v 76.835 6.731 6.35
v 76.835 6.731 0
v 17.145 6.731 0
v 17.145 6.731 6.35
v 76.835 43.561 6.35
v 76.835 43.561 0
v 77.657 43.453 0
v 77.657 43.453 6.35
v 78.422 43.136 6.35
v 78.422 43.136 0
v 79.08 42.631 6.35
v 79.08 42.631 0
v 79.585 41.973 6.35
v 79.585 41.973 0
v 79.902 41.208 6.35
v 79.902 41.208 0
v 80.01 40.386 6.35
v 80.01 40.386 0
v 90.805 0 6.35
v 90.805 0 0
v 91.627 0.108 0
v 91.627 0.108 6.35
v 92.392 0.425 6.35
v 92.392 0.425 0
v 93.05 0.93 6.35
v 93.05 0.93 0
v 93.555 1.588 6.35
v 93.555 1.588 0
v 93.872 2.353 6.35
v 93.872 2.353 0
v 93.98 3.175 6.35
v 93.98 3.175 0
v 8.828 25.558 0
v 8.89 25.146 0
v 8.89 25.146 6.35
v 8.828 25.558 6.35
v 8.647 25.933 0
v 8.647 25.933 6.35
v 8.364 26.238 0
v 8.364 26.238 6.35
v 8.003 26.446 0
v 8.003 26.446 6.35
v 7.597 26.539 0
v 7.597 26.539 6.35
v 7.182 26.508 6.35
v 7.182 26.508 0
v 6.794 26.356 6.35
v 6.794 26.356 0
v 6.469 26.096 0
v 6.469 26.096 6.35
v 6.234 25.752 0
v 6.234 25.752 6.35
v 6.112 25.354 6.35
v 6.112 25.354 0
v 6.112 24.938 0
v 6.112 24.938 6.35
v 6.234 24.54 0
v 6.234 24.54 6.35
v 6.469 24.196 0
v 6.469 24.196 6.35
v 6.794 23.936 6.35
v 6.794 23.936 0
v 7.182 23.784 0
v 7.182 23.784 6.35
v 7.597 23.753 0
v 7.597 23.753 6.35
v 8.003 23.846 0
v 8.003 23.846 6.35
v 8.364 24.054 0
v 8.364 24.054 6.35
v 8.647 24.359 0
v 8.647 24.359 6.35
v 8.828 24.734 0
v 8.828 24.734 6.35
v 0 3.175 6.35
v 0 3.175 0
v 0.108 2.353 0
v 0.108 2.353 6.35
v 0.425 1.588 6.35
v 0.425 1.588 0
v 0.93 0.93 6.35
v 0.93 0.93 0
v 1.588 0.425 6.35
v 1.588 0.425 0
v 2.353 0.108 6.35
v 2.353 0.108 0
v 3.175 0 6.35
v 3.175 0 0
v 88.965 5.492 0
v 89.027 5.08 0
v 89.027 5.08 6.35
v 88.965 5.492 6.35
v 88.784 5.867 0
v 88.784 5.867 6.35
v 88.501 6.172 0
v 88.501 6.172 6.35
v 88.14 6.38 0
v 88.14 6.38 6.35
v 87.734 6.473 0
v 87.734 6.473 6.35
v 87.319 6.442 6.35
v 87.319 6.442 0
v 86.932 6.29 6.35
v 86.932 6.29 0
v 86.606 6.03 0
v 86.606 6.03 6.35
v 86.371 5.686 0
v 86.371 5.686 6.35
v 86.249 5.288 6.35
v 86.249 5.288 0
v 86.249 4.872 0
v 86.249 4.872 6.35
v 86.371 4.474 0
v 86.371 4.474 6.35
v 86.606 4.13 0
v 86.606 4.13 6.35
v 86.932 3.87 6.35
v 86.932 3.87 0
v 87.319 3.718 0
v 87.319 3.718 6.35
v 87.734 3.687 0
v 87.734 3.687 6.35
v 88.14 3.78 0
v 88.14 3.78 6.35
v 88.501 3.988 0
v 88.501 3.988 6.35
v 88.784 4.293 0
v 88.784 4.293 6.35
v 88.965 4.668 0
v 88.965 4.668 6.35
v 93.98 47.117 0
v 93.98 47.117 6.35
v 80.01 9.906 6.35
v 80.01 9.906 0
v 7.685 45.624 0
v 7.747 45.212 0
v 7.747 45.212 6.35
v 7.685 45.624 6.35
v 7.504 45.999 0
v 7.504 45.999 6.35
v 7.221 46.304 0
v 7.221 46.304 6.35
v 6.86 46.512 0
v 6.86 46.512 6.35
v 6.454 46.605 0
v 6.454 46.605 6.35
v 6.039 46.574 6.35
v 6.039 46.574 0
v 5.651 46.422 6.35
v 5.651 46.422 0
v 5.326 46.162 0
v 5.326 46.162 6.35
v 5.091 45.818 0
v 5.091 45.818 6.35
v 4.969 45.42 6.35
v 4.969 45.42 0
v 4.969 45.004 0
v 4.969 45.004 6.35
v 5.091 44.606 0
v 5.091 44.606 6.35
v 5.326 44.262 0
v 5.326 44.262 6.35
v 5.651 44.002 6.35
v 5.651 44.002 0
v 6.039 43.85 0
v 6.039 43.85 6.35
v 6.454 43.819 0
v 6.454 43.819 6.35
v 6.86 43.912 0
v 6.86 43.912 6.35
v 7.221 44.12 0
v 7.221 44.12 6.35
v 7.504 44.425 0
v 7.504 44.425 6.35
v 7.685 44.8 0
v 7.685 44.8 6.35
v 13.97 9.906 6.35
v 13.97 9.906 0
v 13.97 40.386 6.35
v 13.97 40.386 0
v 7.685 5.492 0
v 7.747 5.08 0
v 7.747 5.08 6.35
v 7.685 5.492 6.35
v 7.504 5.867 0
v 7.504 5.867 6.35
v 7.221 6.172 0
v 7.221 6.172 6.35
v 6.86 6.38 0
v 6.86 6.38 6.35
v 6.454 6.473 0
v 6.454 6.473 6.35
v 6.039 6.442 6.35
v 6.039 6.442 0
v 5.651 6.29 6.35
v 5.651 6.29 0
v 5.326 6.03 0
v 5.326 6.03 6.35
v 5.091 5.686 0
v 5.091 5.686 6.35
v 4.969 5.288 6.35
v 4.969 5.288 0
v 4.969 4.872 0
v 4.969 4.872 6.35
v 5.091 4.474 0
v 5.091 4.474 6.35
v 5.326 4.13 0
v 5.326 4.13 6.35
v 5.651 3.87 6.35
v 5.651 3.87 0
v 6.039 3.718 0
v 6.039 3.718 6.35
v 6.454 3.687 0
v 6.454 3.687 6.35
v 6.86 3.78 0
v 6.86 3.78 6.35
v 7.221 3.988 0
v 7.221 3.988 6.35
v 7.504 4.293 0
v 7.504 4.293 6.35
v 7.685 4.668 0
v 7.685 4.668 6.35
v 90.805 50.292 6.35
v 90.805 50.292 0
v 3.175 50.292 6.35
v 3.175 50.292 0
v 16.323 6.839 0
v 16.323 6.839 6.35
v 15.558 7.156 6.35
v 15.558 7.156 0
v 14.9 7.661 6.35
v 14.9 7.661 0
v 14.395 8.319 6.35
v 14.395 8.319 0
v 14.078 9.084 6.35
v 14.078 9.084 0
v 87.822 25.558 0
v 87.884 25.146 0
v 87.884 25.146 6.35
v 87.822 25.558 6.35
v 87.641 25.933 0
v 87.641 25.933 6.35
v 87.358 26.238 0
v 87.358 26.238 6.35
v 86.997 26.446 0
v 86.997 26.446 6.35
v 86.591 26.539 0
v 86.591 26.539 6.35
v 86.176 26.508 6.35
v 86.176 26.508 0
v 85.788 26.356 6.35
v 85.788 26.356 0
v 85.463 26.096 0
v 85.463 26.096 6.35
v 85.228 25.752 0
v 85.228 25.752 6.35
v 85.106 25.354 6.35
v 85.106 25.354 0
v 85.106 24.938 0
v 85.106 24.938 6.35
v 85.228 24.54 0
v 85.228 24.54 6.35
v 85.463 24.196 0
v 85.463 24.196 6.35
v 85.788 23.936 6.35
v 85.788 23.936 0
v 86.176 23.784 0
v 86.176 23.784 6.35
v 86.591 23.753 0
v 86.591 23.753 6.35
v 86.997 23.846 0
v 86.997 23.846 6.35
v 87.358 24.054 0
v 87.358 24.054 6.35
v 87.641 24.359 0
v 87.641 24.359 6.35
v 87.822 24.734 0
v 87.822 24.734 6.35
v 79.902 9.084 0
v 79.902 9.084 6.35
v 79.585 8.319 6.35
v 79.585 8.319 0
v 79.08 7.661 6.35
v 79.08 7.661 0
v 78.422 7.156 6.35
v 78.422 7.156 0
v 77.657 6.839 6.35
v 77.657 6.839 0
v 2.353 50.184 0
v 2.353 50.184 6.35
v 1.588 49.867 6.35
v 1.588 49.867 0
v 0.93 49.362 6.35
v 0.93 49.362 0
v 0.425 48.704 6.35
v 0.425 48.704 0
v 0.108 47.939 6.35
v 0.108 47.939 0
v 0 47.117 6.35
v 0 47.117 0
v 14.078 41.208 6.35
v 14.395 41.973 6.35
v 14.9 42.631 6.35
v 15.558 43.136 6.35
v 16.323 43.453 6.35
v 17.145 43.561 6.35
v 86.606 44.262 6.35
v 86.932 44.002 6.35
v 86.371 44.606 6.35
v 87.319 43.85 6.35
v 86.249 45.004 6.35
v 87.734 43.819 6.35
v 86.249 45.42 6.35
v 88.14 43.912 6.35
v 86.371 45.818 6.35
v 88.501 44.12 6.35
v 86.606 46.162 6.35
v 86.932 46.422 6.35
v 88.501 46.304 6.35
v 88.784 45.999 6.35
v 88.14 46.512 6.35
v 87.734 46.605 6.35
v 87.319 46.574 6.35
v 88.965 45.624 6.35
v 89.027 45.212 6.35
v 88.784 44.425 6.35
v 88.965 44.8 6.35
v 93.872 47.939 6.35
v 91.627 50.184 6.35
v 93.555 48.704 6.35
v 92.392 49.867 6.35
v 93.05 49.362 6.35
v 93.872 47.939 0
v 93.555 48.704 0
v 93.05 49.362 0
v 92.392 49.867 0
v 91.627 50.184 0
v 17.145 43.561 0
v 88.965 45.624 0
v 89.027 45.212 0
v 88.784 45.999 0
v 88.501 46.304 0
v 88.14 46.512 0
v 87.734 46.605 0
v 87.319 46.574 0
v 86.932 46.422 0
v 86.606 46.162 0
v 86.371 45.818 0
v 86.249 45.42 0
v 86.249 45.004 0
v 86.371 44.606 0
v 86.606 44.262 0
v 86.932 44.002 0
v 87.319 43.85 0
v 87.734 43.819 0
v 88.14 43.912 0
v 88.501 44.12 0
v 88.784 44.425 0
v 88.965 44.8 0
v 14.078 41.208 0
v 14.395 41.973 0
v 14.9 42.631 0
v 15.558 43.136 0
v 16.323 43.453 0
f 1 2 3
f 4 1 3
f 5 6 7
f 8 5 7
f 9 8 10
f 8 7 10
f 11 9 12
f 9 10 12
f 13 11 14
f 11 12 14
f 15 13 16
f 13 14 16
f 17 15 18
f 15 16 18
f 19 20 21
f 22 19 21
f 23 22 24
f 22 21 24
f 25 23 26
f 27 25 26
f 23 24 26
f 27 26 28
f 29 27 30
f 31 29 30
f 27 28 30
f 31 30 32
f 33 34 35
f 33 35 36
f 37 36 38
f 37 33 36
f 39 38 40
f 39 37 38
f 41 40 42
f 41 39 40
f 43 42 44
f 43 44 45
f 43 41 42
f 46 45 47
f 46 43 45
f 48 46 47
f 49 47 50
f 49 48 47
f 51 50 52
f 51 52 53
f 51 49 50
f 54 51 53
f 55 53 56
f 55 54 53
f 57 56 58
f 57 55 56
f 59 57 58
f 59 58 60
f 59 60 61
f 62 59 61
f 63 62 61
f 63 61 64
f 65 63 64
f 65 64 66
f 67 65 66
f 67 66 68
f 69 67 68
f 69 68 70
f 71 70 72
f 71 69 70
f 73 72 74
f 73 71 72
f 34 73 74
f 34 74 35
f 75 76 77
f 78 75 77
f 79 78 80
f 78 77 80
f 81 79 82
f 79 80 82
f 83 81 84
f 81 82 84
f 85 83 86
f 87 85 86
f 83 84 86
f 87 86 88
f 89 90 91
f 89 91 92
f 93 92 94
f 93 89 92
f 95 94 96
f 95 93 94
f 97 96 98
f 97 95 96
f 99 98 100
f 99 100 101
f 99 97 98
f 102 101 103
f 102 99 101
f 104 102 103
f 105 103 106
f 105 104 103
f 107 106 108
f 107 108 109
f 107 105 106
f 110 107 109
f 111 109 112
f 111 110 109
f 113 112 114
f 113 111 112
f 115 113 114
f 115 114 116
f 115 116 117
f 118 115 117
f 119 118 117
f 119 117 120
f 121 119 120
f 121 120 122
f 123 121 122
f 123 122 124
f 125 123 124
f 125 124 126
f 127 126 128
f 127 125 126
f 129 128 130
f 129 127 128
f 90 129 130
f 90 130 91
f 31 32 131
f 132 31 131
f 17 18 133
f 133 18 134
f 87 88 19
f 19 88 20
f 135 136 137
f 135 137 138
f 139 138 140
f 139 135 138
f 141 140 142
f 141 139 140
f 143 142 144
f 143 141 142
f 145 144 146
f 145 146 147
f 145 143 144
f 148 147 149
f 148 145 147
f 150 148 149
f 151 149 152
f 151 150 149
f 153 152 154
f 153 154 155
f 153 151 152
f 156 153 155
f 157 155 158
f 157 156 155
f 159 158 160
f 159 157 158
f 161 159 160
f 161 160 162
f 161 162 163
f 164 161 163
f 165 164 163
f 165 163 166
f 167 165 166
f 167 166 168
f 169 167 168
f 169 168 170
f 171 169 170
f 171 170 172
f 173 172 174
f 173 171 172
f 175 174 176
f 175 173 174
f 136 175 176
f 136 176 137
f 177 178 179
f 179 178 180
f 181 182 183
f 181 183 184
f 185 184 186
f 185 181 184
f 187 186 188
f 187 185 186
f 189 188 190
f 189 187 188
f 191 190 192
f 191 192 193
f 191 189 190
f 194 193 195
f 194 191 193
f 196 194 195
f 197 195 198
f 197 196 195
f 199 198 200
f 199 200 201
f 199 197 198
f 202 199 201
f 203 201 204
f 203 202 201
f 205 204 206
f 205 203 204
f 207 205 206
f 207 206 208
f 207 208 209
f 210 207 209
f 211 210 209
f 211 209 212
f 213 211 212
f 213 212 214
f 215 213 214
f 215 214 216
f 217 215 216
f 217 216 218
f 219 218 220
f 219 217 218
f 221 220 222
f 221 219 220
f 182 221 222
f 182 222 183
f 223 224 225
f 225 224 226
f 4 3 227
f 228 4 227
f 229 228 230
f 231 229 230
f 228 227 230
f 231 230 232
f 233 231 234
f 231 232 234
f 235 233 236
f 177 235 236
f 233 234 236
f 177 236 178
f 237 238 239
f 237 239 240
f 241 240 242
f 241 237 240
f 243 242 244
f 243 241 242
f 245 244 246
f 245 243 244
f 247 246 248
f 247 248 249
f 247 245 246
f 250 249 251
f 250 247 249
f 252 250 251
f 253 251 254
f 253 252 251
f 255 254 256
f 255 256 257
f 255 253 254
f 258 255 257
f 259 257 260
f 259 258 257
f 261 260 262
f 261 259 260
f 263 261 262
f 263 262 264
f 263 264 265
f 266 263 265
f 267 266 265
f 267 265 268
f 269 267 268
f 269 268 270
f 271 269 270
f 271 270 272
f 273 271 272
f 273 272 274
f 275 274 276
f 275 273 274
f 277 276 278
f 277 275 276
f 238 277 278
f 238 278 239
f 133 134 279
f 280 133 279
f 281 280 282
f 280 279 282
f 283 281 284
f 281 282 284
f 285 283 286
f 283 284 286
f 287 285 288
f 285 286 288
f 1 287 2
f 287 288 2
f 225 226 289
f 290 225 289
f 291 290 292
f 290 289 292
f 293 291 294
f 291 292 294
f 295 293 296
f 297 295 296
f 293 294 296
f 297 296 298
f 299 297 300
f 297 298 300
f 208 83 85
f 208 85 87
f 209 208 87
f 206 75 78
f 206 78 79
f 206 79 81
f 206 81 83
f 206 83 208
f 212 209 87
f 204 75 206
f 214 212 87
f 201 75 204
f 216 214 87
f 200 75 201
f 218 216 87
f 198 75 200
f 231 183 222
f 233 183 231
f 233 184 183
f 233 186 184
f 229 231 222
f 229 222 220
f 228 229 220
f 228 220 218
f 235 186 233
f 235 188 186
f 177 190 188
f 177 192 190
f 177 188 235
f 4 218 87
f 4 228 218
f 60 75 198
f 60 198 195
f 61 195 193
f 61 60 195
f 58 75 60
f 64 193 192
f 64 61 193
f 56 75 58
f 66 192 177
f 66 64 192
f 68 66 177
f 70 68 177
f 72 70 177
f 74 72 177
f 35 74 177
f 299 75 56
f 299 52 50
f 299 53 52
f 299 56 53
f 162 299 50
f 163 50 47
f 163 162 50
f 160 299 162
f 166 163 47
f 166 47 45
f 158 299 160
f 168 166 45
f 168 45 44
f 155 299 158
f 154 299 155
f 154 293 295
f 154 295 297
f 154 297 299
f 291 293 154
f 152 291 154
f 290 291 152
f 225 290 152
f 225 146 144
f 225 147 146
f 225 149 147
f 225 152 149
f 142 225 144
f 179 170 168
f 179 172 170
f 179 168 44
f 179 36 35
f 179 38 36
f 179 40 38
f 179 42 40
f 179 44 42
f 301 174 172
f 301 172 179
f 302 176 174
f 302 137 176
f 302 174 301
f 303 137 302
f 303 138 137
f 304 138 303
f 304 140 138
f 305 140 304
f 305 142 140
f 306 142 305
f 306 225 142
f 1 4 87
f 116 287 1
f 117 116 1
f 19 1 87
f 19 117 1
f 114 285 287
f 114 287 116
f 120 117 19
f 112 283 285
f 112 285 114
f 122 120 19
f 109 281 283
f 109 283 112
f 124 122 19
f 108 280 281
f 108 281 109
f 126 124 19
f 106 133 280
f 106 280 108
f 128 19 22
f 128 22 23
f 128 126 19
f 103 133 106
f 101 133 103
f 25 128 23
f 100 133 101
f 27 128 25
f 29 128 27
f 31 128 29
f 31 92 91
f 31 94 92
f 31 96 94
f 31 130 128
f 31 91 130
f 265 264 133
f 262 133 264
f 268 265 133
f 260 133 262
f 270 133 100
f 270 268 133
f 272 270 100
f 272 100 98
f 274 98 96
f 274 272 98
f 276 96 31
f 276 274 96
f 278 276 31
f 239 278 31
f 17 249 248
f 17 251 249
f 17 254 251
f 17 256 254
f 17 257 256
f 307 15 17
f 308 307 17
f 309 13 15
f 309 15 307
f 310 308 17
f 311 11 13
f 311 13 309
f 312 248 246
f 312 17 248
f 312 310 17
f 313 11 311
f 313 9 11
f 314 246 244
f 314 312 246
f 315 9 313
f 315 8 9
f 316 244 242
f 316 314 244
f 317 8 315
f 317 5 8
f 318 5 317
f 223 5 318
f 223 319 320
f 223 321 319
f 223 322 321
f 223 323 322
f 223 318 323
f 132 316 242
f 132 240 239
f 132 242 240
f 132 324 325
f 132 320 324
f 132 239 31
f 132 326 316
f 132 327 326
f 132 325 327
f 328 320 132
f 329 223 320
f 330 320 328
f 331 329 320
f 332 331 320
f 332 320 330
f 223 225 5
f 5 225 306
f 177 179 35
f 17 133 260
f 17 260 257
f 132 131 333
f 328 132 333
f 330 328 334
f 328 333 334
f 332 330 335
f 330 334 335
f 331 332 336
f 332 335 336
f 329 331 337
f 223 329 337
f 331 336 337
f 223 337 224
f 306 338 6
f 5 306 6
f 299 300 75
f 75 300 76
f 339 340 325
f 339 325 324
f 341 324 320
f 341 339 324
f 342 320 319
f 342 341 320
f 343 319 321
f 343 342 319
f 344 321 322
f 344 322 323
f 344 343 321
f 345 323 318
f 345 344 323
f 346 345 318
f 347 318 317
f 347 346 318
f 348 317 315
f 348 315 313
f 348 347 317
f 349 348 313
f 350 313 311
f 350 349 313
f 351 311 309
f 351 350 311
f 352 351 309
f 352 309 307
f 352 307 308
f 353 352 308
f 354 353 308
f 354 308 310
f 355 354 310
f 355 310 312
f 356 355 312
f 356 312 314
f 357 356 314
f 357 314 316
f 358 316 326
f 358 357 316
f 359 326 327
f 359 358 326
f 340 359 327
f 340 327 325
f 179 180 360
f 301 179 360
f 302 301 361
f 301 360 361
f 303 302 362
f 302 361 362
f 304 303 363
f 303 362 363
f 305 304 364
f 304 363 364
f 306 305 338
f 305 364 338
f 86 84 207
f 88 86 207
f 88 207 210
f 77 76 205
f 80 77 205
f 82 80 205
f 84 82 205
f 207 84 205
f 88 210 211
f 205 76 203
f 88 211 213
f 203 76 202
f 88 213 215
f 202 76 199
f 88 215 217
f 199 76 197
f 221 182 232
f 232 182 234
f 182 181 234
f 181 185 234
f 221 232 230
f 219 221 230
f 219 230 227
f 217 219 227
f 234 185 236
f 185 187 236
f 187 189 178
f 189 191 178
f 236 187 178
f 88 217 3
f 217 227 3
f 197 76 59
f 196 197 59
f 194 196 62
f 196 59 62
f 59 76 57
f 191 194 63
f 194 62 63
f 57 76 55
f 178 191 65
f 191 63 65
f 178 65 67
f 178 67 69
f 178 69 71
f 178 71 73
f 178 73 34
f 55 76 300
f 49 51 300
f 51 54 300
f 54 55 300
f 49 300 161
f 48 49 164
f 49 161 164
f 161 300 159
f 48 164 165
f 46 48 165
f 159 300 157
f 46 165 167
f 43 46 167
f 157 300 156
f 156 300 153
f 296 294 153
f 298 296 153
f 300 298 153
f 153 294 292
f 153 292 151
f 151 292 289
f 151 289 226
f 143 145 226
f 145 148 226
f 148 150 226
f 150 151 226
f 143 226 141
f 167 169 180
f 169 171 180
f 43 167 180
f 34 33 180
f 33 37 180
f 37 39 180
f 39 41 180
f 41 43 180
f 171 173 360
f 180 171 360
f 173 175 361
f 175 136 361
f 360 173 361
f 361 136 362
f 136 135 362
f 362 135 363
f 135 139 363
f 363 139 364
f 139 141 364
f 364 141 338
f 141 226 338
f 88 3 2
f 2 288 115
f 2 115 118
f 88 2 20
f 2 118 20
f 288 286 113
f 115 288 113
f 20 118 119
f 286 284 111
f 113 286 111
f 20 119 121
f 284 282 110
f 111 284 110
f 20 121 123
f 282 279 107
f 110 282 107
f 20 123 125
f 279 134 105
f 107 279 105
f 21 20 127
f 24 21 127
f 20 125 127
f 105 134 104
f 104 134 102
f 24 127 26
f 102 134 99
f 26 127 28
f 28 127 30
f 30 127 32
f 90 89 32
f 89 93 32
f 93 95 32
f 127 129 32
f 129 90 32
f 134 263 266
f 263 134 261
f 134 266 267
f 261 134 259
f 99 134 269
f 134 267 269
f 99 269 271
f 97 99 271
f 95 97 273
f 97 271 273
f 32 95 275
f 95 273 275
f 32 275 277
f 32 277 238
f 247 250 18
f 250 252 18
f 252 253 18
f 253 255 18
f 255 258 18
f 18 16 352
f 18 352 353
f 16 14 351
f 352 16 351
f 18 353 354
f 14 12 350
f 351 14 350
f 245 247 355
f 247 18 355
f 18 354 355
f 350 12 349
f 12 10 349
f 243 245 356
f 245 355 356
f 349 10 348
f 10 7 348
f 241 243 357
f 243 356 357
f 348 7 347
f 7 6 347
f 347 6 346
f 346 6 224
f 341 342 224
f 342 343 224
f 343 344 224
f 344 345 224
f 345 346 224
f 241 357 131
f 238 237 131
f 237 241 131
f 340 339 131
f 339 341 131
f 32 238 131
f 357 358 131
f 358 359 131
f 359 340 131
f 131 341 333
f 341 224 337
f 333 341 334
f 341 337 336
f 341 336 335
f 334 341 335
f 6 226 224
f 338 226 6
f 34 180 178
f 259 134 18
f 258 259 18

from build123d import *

# Parameters (mm, degrees)
F0_R     = 1.397
F1_DEPTH = 6.35


with BuildPart() as f1:
    # F0 (on Top) → F1 (new body)
    with BuildSketch(Plane.XY):
        with BuildLine():
            ThreePointArc((0, 3.175), (0.929936, 0.929936), (3.175, 0))
            Line((3.175, 0), (90.805, 0))
            ThreePointArc((90.805, 0), (93.050064, 0.929936), (93.98, 3.175))
            Line((93.98, 3.175), (93.98, 47.117))
            ThreePointArc((93.98, 47.117), (93.050064, 49.362064), (90.805, 50.292))
            Line((90.805, 50.292), (3.175, 50.292))
            ThreePointArc((3.175, 50.292), (0.929936, 49.362064), (0, 47.117))
            Line((0, 47.117), (0, 3.175))
        make_face()
        with Locations((6.35, 5.08)):
            Circle(F0_R, mode=Mode.SUBTRACT)
        with Locations((7.493, 25.146)):
            Circle(F0_R, mode=Mode.SUBTRACT)
        with BuildLine():
            Line((76.835, 6.731), (17.145, 6.731))
            ThreePointArc((17.145, 6.731), (14.899936, 7.660936), (13.97, 9.906))
            Line((13.97, 9.906), (13.97, 40.386))
            ThreePointArc((13.97, 40.386), (14.899936, 42.631064), (17.145, 43.561))
            Line((17.145, 43.561), (76.835, 43.561))
            ThreePointArc((76.835, 43.561), (79.080064, 42.631064), (80.01, 40.386))
            Line((80.01, 40.386), (80.01, 9.906))
            ThreePointArc((80.01, 9.906), (79.080064, 7.660936), (76.835, 6.731))
        make_face(mode=Mode.SUBTRACT)
        with Locations((87.63, 5.08)):
            Circle(F0_R, mode=Mode.SUBTRACT)
        with Locations((86.487, 25.146)):
            Circle(F0_R, mode=Mode.SUBTRACT)
        with Locations((6.35, 45.212)):
            Circle(F0_R, mode=Mode.SUBTRACT)
        with Locations((87.63, 45.212)):
            Circle(F0_R, mode=Mode.SUBTRACT)
    extrude(amount=F1_DEPTH)


solid = f1.part
